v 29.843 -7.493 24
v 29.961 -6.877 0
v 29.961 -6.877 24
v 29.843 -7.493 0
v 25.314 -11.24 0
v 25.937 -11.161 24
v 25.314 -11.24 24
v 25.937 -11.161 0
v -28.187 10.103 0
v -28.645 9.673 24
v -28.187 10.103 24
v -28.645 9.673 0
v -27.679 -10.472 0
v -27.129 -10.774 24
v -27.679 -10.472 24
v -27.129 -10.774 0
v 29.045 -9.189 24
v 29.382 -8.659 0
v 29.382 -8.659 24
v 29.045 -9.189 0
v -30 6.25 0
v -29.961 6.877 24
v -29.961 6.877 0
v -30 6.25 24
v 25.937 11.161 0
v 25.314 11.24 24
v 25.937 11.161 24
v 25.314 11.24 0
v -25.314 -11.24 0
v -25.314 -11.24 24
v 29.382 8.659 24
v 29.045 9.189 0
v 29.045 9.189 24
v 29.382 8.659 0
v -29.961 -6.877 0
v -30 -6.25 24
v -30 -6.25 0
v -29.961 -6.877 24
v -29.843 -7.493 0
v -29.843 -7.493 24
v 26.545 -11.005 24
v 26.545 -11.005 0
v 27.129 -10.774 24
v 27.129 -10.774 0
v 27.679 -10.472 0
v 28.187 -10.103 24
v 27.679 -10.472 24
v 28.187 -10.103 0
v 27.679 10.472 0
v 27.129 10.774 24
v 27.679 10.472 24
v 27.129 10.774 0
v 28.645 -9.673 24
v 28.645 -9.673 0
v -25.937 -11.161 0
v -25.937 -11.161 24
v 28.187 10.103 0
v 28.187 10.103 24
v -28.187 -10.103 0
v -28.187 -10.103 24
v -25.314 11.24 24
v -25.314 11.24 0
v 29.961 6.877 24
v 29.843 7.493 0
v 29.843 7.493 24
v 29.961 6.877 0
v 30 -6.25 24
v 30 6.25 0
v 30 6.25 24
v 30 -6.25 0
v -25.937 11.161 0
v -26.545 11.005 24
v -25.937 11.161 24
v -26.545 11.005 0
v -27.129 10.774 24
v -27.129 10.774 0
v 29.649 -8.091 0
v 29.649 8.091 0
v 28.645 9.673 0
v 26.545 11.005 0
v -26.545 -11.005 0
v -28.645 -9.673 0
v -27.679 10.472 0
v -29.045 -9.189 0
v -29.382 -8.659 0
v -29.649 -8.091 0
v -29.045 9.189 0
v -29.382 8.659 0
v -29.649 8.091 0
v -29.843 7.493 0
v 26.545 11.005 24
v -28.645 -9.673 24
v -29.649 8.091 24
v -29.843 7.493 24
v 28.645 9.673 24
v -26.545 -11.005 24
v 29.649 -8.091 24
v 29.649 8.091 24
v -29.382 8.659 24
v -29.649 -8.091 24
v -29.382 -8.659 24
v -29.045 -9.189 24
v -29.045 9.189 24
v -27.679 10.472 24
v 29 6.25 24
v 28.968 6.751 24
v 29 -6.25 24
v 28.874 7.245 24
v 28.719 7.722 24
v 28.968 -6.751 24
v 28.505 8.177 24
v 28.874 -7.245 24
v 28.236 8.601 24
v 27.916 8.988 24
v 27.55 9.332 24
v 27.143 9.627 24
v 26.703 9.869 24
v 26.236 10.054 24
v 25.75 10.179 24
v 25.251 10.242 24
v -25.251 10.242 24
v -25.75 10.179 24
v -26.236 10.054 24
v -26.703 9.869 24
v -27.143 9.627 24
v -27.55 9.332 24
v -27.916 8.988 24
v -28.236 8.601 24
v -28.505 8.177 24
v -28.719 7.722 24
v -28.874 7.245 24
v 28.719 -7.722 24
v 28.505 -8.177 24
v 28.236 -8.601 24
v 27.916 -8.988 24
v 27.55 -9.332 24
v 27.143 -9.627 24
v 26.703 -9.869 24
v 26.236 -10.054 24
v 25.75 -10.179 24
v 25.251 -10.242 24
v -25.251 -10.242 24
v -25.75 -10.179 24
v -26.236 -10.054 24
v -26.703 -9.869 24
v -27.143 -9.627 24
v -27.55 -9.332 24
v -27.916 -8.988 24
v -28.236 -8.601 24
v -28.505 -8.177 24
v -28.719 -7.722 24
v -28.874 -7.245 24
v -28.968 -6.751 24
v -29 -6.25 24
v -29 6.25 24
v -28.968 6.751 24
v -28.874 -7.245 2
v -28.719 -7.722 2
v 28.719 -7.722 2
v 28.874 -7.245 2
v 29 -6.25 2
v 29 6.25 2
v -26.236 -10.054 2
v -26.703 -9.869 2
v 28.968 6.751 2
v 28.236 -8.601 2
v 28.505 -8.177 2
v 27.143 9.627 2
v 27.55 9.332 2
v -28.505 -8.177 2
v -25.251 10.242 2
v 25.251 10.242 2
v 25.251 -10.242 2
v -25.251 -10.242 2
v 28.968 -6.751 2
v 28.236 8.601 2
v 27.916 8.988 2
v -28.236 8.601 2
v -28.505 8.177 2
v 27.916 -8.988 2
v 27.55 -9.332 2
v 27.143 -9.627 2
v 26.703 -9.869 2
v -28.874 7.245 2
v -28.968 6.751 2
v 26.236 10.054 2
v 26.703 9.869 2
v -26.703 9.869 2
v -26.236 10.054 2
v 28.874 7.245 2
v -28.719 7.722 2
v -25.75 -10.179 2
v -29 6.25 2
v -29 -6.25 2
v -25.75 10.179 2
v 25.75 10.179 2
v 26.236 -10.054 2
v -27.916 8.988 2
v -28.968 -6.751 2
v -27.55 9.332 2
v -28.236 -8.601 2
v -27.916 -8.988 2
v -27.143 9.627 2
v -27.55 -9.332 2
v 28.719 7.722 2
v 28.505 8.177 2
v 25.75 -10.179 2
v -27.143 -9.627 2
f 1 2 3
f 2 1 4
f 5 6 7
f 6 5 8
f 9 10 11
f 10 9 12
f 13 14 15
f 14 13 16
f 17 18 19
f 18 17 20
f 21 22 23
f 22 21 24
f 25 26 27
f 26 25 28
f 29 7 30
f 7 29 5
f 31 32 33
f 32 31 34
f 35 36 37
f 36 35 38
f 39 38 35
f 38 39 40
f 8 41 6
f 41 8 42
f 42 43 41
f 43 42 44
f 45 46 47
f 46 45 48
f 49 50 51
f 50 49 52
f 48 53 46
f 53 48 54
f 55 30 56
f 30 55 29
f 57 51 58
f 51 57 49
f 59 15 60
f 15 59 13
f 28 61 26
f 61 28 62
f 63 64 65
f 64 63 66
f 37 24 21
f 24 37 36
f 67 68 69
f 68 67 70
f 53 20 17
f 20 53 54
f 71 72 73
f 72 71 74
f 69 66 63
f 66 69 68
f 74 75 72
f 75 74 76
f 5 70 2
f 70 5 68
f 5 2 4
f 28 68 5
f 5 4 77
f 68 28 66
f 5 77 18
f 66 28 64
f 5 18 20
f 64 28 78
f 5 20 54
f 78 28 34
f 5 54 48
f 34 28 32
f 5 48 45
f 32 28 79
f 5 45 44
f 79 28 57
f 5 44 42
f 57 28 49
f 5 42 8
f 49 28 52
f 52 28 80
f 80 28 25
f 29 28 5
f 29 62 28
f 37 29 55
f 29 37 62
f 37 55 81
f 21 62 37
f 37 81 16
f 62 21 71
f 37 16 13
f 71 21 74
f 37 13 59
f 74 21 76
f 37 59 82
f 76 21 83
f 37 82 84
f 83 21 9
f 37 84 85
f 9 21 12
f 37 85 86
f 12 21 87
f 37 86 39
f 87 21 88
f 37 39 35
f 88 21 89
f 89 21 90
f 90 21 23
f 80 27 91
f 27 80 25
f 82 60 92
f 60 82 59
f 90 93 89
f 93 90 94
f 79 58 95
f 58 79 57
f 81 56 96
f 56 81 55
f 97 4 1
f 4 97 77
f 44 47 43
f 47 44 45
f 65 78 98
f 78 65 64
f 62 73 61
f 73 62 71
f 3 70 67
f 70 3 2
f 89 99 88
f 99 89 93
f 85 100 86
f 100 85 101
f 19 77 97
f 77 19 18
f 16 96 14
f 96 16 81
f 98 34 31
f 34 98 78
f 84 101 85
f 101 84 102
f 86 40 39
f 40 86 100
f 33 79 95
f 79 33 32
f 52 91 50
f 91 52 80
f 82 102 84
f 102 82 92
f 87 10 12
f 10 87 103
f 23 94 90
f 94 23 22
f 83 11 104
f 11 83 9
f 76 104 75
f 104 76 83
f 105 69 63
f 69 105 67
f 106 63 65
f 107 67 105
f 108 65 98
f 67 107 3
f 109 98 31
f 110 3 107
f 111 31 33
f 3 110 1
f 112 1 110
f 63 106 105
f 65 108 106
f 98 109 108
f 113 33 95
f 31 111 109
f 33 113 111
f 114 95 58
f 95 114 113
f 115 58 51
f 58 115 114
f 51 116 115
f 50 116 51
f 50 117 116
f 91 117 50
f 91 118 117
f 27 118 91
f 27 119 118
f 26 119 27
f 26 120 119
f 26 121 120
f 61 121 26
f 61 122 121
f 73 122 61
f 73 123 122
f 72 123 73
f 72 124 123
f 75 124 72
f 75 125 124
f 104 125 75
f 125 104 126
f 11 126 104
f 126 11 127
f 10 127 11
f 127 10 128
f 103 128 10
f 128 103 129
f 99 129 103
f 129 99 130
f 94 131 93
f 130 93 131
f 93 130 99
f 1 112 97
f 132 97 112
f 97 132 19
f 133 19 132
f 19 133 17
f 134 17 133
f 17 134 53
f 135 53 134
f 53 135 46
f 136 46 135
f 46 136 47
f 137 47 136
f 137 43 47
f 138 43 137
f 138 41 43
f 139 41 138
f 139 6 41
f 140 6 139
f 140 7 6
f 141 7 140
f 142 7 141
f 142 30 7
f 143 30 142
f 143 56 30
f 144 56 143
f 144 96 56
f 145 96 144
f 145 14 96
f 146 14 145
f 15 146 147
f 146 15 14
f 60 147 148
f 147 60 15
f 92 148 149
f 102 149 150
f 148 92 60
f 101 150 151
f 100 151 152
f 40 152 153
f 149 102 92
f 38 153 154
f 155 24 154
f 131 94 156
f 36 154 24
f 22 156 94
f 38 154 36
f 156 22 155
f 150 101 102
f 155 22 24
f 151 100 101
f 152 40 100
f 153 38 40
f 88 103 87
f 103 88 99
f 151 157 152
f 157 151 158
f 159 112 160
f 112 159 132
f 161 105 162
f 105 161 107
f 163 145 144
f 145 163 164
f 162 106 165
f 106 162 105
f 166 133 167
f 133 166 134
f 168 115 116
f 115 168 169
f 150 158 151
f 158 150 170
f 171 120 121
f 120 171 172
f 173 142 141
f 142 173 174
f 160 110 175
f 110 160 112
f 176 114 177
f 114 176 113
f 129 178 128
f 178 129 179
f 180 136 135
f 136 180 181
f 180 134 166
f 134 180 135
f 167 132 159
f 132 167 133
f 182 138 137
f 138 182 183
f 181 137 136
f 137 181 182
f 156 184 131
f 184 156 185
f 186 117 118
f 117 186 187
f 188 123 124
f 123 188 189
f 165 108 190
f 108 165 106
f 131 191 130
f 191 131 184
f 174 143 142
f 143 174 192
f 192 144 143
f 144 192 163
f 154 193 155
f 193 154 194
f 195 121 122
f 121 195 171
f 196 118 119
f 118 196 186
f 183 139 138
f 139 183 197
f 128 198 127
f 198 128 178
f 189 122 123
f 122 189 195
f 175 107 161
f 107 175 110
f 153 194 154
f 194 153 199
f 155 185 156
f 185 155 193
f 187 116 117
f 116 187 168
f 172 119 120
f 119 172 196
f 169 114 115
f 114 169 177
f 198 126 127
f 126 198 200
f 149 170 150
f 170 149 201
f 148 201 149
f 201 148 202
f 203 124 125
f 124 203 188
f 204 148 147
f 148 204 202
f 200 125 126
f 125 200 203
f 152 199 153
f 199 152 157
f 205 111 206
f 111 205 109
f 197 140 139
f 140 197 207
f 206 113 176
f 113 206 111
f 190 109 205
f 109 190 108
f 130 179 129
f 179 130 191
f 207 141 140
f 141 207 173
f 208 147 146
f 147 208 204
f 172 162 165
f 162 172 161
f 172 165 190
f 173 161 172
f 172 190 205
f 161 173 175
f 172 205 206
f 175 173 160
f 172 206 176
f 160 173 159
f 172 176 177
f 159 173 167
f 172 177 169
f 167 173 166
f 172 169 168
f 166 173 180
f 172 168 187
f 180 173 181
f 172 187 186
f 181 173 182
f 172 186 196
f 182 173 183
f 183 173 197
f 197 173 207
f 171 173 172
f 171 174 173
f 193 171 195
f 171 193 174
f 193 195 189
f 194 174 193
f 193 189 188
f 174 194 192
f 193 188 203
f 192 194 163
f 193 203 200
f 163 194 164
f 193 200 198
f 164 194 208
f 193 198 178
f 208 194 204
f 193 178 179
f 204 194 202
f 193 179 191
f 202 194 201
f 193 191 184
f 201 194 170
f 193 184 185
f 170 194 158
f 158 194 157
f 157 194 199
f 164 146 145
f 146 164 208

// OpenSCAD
$fn = 50;


difference() {
	union() {
		hull() {
			translate(v = [-25.0000000000, 6.2500000000, 0]) {
				cylinder(h = 24, r = 5);
			}
			translate(v = [25.0000000000, 6.2500000000, 0]) {
				cylinder(h = 24, r = 5);
			}
			translate(v = [-25.0000000000, -6.2500000000, 0]) {
				cylinder(h = 24, r = 5);
			}
			translate(v = [25.0000000000, -6.2500000000, 0]) {
				cylinder(h = 24, r = 5);
			}
		}
	}
	union() {
		translate(v = [0, 0, 2]) {
			hull() {
				translate(v = [-25.0000000000, 6.2500000000, 0]) {
					cylinder(h = 22, r = 4);
				}
				translate(v = [25.0000000000, 6.2500000000, 0]) {
					cylinder(h = 22, r = 4);
				}
				translate(v = [-25.0000000000, -6.2500000000, 0]) {
					cylinder(h = 22, r = 4);
				}
				translate(v = [25.0000000000, -6.2500000000, 0]) {
					cylinder(h = 22, r = 4);
				}
			}
		}
	}
}
